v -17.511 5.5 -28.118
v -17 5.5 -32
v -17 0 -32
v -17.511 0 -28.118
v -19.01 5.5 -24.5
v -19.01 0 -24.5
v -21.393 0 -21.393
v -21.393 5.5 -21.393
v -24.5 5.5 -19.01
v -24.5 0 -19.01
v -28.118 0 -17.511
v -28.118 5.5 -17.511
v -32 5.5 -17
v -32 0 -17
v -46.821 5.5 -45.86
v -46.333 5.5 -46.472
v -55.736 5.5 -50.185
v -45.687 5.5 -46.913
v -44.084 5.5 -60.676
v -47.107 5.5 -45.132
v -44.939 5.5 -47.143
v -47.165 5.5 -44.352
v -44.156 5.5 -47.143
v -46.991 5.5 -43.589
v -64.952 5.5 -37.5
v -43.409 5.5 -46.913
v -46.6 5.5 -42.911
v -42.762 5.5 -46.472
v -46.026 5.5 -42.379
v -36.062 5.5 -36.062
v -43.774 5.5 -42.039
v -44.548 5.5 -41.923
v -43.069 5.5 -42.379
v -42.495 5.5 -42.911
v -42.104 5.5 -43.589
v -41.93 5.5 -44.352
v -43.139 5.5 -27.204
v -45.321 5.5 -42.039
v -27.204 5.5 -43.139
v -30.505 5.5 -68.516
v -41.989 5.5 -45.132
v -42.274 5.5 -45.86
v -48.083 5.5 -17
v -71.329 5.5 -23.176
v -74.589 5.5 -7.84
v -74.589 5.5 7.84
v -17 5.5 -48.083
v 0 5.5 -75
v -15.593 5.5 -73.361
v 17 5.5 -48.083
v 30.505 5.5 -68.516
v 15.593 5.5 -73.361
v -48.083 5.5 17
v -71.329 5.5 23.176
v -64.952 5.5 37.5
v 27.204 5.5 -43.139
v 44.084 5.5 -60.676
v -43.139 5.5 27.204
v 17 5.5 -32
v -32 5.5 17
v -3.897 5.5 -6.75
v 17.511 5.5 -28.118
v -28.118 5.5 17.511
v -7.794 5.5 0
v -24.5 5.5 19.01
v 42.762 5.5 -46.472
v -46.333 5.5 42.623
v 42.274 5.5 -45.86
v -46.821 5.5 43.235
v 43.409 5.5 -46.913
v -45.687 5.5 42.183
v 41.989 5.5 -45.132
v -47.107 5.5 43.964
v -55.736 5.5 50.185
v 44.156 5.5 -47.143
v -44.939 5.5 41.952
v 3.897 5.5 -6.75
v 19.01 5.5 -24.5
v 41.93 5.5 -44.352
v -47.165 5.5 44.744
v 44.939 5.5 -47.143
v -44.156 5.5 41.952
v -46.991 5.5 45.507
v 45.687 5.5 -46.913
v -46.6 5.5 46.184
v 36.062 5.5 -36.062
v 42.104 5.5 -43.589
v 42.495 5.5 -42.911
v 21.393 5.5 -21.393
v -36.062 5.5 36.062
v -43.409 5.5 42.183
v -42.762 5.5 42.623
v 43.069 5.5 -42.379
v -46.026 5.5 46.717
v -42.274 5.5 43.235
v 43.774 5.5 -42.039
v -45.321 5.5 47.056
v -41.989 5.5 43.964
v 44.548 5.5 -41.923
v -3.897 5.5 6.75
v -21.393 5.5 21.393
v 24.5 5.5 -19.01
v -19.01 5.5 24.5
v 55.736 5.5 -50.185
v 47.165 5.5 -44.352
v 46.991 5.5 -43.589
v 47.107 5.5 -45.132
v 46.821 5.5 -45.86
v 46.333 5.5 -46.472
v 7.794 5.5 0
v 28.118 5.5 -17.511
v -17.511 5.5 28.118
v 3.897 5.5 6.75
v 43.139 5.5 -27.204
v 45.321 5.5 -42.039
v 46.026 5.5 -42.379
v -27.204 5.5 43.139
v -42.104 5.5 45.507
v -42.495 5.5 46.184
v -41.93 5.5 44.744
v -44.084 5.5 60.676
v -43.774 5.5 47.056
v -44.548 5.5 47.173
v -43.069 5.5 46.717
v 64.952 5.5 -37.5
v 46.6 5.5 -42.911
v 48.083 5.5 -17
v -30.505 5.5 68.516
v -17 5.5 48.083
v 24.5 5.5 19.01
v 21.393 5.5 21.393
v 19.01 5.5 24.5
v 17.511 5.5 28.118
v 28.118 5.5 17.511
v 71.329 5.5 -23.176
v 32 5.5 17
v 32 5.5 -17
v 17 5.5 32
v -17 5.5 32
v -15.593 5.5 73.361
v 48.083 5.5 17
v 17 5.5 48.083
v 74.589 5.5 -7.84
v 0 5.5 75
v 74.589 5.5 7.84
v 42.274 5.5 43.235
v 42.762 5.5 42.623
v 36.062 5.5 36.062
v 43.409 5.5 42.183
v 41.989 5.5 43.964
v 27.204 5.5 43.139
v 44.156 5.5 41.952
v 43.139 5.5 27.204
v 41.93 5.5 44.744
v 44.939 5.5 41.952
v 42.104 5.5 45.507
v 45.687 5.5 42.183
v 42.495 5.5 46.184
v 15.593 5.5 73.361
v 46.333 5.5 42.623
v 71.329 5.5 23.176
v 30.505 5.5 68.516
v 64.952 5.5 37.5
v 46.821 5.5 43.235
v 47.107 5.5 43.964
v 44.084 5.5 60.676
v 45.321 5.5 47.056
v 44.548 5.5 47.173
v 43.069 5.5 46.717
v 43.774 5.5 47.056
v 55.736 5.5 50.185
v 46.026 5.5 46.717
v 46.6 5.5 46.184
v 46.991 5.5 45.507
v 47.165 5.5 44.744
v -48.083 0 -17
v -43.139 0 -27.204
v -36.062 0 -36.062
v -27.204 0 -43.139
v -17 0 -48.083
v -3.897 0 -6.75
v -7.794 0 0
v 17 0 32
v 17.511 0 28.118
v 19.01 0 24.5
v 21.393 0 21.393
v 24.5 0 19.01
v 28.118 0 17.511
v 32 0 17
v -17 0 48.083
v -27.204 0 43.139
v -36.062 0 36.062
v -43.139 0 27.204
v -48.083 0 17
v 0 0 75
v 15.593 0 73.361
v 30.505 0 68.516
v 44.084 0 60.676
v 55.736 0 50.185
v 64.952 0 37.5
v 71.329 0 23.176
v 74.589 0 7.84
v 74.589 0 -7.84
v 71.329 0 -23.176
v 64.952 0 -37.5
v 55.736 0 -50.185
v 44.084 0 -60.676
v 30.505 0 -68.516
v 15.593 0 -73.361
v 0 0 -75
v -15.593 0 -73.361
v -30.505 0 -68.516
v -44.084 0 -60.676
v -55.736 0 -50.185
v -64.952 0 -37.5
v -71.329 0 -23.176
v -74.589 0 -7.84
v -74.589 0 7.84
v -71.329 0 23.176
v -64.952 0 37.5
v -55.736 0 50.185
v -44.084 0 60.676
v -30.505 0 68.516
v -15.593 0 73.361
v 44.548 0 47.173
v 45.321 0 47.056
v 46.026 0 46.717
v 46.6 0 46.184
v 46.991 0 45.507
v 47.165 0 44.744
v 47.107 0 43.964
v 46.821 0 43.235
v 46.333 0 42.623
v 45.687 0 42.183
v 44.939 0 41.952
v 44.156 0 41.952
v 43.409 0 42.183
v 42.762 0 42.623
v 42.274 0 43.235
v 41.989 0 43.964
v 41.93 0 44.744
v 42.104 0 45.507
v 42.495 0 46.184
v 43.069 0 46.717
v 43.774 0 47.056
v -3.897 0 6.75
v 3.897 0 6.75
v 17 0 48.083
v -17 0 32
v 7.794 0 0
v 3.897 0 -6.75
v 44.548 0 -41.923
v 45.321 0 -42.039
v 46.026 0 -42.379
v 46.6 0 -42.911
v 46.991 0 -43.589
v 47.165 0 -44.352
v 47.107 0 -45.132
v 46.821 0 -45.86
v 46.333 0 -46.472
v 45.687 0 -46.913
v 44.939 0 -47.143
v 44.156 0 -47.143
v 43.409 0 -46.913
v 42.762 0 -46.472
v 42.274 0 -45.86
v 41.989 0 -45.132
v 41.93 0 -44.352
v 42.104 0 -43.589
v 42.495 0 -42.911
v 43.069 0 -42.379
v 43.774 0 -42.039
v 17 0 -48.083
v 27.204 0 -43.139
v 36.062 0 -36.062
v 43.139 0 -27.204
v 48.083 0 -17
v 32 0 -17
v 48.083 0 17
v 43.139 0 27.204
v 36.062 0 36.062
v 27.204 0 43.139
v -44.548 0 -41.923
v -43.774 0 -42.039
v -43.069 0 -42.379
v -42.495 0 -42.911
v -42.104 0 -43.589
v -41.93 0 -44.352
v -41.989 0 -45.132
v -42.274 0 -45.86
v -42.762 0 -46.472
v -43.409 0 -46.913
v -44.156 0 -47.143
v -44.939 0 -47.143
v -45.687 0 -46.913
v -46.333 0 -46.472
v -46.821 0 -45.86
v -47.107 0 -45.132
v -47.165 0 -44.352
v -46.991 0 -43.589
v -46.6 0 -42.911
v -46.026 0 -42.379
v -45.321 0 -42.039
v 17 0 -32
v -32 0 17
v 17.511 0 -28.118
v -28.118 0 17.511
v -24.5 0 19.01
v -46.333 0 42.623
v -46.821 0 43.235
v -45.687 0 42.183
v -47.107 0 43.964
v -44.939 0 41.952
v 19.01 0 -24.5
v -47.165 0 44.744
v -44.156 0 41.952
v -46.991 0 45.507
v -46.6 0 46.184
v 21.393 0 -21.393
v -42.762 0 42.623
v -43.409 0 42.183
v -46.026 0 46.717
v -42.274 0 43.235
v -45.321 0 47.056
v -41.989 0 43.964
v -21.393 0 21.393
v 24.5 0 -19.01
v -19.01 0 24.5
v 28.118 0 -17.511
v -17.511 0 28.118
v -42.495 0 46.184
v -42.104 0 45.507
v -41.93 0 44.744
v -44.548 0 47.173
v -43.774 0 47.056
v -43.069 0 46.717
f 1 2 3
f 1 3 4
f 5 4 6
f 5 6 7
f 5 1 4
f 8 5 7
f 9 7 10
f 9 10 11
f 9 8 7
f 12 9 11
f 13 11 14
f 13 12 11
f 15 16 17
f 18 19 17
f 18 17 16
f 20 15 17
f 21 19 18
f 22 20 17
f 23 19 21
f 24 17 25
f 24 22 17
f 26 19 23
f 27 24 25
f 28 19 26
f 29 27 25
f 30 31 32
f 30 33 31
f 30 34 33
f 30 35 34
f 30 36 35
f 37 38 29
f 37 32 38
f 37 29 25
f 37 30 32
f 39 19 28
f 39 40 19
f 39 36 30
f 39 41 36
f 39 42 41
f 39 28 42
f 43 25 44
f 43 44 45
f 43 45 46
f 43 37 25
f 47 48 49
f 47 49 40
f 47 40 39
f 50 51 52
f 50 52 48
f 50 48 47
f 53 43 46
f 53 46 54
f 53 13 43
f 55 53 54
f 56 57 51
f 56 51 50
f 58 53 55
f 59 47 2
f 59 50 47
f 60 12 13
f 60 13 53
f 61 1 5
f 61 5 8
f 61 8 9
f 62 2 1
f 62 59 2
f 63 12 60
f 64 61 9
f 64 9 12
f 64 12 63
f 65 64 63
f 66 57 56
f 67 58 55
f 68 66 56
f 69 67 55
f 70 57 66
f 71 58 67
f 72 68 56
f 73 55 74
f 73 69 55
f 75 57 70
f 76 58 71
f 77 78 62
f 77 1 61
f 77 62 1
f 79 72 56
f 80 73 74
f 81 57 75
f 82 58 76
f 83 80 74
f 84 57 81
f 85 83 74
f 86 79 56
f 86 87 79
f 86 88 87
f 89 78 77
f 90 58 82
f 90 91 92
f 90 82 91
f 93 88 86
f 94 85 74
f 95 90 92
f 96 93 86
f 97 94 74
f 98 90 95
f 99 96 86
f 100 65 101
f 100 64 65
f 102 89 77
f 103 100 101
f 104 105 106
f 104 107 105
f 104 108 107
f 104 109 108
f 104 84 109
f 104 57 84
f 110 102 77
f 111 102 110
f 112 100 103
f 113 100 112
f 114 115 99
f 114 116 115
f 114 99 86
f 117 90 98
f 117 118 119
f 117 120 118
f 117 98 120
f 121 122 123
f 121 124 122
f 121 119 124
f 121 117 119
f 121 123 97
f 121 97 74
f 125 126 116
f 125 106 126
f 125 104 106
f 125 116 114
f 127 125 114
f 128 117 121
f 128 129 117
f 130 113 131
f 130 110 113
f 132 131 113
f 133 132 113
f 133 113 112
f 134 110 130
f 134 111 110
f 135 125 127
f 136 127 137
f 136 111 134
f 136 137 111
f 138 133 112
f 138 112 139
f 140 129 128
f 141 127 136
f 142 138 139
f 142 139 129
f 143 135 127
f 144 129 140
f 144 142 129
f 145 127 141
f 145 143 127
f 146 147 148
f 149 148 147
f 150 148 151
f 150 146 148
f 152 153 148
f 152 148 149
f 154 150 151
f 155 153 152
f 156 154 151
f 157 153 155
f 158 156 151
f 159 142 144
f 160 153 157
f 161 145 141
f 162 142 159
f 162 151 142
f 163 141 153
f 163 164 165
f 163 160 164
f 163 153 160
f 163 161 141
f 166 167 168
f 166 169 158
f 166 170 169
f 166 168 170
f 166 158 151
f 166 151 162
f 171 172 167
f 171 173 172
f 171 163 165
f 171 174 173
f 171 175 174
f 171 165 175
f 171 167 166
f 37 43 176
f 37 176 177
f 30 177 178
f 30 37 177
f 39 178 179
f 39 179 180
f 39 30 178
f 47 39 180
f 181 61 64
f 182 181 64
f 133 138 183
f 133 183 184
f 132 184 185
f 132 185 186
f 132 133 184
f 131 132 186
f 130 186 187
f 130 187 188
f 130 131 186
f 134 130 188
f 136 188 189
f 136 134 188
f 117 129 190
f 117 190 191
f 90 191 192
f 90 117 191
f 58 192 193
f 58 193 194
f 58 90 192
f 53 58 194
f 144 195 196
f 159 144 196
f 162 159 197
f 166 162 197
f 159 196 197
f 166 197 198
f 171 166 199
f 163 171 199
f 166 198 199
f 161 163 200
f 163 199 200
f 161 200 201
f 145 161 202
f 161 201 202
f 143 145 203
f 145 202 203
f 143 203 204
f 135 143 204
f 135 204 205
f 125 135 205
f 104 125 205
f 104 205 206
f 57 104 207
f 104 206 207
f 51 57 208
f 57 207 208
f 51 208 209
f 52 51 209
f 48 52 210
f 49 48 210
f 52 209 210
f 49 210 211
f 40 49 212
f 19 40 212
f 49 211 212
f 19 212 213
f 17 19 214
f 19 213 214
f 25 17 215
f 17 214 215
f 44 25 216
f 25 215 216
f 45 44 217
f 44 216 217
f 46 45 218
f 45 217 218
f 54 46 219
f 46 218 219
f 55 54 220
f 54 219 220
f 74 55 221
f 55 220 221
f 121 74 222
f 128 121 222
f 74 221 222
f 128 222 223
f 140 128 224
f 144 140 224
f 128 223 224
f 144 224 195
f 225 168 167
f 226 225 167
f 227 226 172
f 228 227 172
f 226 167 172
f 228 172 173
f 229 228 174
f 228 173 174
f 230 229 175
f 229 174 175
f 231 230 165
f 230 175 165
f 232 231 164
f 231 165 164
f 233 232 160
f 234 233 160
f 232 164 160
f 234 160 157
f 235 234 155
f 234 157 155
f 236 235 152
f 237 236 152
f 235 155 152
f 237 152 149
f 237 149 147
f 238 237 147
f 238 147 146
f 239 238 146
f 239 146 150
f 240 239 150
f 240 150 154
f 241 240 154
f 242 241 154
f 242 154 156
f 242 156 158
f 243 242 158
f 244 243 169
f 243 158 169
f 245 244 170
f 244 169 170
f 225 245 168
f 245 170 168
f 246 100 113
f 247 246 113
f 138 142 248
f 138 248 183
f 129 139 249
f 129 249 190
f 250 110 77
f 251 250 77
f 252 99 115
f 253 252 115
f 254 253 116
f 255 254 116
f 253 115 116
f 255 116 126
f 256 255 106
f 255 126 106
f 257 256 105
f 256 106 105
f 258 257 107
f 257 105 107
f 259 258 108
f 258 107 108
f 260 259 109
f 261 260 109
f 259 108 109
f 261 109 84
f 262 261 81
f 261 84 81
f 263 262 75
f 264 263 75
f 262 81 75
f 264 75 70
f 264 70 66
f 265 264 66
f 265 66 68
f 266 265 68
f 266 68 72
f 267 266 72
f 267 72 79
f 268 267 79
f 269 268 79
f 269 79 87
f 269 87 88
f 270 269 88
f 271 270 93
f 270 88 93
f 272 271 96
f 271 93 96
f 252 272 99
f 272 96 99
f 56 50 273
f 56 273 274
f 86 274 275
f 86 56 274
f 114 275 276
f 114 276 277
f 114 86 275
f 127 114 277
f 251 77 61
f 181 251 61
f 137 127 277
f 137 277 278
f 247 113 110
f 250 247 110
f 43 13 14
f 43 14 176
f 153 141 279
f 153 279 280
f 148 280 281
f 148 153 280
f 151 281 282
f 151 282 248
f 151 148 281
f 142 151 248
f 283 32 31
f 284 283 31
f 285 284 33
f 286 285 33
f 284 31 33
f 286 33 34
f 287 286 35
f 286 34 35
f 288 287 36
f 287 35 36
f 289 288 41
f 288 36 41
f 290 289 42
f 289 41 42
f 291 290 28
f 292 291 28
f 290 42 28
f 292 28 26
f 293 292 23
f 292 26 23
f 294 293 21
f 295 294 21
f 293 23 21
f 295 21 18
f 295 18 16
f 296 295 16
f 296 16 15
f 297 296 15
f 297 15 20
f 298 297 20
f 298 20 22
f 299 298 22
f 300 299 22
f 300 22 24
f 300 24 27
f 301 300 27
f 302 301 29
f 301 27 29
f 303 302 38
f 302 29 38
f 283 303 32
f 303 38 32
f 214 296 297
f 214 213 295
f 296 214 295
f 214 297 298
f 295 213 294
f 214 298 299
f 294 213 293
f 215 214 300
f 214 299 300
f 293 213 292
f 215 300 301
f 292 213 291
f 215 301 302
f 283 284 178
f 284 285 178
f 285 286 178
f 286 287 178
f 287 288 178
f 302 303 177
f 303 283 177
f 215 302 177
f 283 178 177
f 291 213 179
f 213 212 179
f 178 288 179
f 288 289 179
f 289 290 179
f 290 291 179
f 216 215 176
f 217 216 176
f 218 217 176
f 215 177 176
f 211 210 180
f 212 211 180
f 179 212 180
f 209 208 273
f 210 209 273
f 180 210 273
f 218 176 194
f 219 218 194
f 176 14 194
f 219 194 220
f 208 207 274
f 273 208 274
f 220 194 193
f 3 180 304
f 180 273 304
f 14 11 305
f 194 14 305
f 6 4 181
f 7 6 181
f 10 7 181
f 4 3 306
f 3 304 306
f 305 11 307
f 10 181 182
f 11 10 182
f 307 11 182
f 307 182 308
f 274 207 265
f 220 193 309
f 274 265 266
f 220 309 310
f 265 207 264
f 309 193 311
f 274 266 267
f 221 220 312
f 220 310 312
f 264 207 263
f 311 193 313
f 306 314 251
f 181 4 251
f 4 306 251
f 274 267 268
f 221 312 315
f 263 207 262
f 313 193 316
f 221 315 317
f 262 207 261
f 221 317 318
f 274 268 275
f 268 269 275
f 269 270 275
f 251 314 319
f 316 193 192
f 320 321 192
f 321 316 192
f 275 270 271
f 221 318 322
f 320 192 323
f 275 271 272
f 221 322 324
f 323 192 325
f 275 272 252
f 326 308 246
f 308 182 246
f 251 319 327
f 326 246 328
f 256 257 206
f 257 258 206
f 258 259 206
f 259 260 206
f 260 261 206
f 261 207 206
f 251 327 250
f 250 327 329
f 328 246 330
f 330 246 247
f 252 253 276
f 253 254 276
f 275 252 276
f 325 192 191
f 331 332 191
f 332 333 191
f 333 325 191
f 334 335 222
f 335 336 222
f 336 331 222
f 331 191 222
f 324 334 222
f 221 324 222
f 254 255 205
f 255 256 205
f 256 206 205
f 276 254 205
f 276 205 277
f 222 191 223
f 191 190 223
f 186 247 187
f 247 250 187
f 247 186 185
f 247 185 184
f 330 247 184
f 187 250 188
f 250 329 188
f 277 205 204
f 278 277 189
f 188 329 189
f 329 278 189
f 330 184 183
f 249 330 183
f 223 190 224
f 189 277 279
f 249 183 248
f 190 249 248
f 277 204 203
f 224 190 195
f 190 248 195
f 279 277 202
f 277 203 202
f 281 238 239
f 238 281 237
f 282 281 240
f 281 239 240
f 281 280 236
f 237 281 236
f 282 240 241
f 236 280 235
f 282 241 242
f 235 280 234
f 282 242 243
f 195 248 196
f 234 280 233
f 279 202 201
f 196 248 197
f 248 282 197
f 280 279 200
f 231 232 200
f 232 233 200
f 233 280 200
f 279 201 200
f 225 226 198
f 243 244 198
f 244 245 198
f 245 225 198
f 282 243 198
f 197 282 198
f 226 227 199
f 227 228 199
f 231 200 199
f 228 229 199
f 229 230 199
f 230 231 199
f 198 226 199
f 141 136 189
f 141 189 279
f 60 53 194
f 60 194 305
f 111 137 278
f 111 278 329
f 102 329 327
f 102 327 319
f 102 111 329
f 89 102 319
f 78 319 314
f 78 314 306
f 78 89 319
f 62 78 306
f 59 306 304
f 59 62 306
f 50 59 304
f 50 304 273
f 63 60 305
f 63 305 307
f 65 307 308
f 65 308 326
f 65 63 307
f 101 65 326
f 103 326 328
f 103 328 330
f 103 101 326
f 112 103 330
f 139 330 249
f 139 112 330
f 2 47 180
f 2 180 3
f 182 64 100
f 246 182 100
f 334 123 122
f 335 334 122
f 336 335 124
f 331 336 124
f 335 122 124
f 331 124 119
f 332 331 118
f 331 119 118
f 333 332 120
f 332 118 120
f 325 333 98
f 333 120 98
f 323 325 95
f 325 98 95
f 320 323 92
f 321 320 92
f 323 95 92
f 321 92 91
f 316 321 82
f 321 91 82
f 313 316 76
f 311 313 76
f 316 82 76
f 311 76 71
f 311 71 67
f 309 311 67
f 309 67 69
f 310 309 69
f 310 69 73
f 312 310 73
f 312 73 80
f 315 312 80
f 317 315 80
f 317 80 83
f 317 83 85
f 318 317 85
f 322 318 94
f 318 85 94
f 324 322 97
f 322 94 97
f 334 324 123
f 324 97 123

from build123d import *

# Parameters (mm, degrees)
SKETCH1_R           = 75
SKETCH1_R_2         = 4.25
BOSS_EXTRUDE1_DEPTH = 5.5
SKETCH4_R           = 2.625
CUT_EXTRUDE2_DEPTH  = 5.5
CUT_EXTRUDE3_DEPTH  = 5.5


with BuildPart() as part:
    # Sketch1 → Boss-Extrude1 (new body)
    with BuildSketch(Plane(origin=(0, 0, 0), x_dir=(1, 0, 0), z_dir=(0, 1, 0))):
        with Locations(Location((0, 0, 0), (0, 0, 270))):
            Circle(SKETCH1_R)
        with Locations(Location((0, 0, 0), (0, 0, 270))):
            Circle(SKETCH1_R_2, mode=Mode.SUBTRACT)
    extrude(amount=BOSS_EXTRUDE1_DEPTH)

    # Sketch4 → Cut-Extrude2 (cut)
    with BuildSketch(Plane(origin=(0, 5.5, 0), x_dir=(1, 0, 0), z_dir=(0, 1, 0))):
        with Locations(Location((44.547727215, -44.547727215, 0), (0, 0, 270))):
            Circle(SKETCH4_R)
        with Locations(Location((-44.547727215, -44.547727215, 0), (0, 0, 270))):
            Circle(SKETCH4_R)
        with Locations(Location((44.547727215, 44.547727215, 0), (0, 0, 270))):
            Circle(SKETCH4_R)
        with Locations(Location((-44.547727215, 44.547727215, 0), (0, 0, 270))):
            Circle(SKETCH4_R)
        Polygon((7.794228634, 0), (3.897114317, 6.75), (-3.897114317, 6.75), (-7.794228634, 0), (-3.897114317, -6.75), (3.897114317, -6.75), align=None)
    extrude(amount=-CUT_EXTRUDE2_DEPTH, mode=Mode.SUBTRACT)

    # Sketch5 → Cut-Extrude3 (cut)
    with BuildSketch(Plane(origin=(0, 5.5, 0), x_dir=(1, 0, 0), z_dir=(0, 1, 0))):
        with BuildLine():
            Line((32, -17), (48.083261121, -17))
            ThreePointArc((48.083261121, -17), (36.062445841, -36.062445841), (17, -48.083261121))
            Line((17, -48.083261121), (17, -32))
            ThreePointArc((17, -32), (21.393398282, -21.393398282), (32, -17))
        make_face()
        with BuildLine():
            Line((-17, -32), (-17, -48.083261121))
            ThreePointArc((-17, -48.083261121), (-36.062445841, -36.062445841), (-48.083261121, -17))
            Line((-48.083261121, -17), (-32, -17))
            ThreePointArc((-32, -17), (-21.393398282, -21.393398282), (-17, -32))
        make_face()
        with BuildLine():
            Line((17, 32), (17, 48.083261121))
            ThreePointArc((17, 48.083261121), (36.062445841, 36.062445841), (48.083261121, 17))
            Line((48.083261121, 17), (32, 17))
            ThreePointArc((32, 17), (21.393398282, 21.393398282), (17, 32))
        make_face()
        with BuildLine():
            Line((-32, 17), (-48.083261121, 17))
            ThreePointArc((-48.083261121, 17), (-36.062445841, 36.062445841), (-17, 48.083261121))
            Line((-17, 48.083261121), (-17, 32))
            ThreePointArc((-17, 32), (-21.393398282, 21.393398282), (-32, 17))
        make_face()
    extrude(amount=-CUT_EXTRUDE3_DEPTH, mode=Mode.SUBTRACT)


solid = part.part
